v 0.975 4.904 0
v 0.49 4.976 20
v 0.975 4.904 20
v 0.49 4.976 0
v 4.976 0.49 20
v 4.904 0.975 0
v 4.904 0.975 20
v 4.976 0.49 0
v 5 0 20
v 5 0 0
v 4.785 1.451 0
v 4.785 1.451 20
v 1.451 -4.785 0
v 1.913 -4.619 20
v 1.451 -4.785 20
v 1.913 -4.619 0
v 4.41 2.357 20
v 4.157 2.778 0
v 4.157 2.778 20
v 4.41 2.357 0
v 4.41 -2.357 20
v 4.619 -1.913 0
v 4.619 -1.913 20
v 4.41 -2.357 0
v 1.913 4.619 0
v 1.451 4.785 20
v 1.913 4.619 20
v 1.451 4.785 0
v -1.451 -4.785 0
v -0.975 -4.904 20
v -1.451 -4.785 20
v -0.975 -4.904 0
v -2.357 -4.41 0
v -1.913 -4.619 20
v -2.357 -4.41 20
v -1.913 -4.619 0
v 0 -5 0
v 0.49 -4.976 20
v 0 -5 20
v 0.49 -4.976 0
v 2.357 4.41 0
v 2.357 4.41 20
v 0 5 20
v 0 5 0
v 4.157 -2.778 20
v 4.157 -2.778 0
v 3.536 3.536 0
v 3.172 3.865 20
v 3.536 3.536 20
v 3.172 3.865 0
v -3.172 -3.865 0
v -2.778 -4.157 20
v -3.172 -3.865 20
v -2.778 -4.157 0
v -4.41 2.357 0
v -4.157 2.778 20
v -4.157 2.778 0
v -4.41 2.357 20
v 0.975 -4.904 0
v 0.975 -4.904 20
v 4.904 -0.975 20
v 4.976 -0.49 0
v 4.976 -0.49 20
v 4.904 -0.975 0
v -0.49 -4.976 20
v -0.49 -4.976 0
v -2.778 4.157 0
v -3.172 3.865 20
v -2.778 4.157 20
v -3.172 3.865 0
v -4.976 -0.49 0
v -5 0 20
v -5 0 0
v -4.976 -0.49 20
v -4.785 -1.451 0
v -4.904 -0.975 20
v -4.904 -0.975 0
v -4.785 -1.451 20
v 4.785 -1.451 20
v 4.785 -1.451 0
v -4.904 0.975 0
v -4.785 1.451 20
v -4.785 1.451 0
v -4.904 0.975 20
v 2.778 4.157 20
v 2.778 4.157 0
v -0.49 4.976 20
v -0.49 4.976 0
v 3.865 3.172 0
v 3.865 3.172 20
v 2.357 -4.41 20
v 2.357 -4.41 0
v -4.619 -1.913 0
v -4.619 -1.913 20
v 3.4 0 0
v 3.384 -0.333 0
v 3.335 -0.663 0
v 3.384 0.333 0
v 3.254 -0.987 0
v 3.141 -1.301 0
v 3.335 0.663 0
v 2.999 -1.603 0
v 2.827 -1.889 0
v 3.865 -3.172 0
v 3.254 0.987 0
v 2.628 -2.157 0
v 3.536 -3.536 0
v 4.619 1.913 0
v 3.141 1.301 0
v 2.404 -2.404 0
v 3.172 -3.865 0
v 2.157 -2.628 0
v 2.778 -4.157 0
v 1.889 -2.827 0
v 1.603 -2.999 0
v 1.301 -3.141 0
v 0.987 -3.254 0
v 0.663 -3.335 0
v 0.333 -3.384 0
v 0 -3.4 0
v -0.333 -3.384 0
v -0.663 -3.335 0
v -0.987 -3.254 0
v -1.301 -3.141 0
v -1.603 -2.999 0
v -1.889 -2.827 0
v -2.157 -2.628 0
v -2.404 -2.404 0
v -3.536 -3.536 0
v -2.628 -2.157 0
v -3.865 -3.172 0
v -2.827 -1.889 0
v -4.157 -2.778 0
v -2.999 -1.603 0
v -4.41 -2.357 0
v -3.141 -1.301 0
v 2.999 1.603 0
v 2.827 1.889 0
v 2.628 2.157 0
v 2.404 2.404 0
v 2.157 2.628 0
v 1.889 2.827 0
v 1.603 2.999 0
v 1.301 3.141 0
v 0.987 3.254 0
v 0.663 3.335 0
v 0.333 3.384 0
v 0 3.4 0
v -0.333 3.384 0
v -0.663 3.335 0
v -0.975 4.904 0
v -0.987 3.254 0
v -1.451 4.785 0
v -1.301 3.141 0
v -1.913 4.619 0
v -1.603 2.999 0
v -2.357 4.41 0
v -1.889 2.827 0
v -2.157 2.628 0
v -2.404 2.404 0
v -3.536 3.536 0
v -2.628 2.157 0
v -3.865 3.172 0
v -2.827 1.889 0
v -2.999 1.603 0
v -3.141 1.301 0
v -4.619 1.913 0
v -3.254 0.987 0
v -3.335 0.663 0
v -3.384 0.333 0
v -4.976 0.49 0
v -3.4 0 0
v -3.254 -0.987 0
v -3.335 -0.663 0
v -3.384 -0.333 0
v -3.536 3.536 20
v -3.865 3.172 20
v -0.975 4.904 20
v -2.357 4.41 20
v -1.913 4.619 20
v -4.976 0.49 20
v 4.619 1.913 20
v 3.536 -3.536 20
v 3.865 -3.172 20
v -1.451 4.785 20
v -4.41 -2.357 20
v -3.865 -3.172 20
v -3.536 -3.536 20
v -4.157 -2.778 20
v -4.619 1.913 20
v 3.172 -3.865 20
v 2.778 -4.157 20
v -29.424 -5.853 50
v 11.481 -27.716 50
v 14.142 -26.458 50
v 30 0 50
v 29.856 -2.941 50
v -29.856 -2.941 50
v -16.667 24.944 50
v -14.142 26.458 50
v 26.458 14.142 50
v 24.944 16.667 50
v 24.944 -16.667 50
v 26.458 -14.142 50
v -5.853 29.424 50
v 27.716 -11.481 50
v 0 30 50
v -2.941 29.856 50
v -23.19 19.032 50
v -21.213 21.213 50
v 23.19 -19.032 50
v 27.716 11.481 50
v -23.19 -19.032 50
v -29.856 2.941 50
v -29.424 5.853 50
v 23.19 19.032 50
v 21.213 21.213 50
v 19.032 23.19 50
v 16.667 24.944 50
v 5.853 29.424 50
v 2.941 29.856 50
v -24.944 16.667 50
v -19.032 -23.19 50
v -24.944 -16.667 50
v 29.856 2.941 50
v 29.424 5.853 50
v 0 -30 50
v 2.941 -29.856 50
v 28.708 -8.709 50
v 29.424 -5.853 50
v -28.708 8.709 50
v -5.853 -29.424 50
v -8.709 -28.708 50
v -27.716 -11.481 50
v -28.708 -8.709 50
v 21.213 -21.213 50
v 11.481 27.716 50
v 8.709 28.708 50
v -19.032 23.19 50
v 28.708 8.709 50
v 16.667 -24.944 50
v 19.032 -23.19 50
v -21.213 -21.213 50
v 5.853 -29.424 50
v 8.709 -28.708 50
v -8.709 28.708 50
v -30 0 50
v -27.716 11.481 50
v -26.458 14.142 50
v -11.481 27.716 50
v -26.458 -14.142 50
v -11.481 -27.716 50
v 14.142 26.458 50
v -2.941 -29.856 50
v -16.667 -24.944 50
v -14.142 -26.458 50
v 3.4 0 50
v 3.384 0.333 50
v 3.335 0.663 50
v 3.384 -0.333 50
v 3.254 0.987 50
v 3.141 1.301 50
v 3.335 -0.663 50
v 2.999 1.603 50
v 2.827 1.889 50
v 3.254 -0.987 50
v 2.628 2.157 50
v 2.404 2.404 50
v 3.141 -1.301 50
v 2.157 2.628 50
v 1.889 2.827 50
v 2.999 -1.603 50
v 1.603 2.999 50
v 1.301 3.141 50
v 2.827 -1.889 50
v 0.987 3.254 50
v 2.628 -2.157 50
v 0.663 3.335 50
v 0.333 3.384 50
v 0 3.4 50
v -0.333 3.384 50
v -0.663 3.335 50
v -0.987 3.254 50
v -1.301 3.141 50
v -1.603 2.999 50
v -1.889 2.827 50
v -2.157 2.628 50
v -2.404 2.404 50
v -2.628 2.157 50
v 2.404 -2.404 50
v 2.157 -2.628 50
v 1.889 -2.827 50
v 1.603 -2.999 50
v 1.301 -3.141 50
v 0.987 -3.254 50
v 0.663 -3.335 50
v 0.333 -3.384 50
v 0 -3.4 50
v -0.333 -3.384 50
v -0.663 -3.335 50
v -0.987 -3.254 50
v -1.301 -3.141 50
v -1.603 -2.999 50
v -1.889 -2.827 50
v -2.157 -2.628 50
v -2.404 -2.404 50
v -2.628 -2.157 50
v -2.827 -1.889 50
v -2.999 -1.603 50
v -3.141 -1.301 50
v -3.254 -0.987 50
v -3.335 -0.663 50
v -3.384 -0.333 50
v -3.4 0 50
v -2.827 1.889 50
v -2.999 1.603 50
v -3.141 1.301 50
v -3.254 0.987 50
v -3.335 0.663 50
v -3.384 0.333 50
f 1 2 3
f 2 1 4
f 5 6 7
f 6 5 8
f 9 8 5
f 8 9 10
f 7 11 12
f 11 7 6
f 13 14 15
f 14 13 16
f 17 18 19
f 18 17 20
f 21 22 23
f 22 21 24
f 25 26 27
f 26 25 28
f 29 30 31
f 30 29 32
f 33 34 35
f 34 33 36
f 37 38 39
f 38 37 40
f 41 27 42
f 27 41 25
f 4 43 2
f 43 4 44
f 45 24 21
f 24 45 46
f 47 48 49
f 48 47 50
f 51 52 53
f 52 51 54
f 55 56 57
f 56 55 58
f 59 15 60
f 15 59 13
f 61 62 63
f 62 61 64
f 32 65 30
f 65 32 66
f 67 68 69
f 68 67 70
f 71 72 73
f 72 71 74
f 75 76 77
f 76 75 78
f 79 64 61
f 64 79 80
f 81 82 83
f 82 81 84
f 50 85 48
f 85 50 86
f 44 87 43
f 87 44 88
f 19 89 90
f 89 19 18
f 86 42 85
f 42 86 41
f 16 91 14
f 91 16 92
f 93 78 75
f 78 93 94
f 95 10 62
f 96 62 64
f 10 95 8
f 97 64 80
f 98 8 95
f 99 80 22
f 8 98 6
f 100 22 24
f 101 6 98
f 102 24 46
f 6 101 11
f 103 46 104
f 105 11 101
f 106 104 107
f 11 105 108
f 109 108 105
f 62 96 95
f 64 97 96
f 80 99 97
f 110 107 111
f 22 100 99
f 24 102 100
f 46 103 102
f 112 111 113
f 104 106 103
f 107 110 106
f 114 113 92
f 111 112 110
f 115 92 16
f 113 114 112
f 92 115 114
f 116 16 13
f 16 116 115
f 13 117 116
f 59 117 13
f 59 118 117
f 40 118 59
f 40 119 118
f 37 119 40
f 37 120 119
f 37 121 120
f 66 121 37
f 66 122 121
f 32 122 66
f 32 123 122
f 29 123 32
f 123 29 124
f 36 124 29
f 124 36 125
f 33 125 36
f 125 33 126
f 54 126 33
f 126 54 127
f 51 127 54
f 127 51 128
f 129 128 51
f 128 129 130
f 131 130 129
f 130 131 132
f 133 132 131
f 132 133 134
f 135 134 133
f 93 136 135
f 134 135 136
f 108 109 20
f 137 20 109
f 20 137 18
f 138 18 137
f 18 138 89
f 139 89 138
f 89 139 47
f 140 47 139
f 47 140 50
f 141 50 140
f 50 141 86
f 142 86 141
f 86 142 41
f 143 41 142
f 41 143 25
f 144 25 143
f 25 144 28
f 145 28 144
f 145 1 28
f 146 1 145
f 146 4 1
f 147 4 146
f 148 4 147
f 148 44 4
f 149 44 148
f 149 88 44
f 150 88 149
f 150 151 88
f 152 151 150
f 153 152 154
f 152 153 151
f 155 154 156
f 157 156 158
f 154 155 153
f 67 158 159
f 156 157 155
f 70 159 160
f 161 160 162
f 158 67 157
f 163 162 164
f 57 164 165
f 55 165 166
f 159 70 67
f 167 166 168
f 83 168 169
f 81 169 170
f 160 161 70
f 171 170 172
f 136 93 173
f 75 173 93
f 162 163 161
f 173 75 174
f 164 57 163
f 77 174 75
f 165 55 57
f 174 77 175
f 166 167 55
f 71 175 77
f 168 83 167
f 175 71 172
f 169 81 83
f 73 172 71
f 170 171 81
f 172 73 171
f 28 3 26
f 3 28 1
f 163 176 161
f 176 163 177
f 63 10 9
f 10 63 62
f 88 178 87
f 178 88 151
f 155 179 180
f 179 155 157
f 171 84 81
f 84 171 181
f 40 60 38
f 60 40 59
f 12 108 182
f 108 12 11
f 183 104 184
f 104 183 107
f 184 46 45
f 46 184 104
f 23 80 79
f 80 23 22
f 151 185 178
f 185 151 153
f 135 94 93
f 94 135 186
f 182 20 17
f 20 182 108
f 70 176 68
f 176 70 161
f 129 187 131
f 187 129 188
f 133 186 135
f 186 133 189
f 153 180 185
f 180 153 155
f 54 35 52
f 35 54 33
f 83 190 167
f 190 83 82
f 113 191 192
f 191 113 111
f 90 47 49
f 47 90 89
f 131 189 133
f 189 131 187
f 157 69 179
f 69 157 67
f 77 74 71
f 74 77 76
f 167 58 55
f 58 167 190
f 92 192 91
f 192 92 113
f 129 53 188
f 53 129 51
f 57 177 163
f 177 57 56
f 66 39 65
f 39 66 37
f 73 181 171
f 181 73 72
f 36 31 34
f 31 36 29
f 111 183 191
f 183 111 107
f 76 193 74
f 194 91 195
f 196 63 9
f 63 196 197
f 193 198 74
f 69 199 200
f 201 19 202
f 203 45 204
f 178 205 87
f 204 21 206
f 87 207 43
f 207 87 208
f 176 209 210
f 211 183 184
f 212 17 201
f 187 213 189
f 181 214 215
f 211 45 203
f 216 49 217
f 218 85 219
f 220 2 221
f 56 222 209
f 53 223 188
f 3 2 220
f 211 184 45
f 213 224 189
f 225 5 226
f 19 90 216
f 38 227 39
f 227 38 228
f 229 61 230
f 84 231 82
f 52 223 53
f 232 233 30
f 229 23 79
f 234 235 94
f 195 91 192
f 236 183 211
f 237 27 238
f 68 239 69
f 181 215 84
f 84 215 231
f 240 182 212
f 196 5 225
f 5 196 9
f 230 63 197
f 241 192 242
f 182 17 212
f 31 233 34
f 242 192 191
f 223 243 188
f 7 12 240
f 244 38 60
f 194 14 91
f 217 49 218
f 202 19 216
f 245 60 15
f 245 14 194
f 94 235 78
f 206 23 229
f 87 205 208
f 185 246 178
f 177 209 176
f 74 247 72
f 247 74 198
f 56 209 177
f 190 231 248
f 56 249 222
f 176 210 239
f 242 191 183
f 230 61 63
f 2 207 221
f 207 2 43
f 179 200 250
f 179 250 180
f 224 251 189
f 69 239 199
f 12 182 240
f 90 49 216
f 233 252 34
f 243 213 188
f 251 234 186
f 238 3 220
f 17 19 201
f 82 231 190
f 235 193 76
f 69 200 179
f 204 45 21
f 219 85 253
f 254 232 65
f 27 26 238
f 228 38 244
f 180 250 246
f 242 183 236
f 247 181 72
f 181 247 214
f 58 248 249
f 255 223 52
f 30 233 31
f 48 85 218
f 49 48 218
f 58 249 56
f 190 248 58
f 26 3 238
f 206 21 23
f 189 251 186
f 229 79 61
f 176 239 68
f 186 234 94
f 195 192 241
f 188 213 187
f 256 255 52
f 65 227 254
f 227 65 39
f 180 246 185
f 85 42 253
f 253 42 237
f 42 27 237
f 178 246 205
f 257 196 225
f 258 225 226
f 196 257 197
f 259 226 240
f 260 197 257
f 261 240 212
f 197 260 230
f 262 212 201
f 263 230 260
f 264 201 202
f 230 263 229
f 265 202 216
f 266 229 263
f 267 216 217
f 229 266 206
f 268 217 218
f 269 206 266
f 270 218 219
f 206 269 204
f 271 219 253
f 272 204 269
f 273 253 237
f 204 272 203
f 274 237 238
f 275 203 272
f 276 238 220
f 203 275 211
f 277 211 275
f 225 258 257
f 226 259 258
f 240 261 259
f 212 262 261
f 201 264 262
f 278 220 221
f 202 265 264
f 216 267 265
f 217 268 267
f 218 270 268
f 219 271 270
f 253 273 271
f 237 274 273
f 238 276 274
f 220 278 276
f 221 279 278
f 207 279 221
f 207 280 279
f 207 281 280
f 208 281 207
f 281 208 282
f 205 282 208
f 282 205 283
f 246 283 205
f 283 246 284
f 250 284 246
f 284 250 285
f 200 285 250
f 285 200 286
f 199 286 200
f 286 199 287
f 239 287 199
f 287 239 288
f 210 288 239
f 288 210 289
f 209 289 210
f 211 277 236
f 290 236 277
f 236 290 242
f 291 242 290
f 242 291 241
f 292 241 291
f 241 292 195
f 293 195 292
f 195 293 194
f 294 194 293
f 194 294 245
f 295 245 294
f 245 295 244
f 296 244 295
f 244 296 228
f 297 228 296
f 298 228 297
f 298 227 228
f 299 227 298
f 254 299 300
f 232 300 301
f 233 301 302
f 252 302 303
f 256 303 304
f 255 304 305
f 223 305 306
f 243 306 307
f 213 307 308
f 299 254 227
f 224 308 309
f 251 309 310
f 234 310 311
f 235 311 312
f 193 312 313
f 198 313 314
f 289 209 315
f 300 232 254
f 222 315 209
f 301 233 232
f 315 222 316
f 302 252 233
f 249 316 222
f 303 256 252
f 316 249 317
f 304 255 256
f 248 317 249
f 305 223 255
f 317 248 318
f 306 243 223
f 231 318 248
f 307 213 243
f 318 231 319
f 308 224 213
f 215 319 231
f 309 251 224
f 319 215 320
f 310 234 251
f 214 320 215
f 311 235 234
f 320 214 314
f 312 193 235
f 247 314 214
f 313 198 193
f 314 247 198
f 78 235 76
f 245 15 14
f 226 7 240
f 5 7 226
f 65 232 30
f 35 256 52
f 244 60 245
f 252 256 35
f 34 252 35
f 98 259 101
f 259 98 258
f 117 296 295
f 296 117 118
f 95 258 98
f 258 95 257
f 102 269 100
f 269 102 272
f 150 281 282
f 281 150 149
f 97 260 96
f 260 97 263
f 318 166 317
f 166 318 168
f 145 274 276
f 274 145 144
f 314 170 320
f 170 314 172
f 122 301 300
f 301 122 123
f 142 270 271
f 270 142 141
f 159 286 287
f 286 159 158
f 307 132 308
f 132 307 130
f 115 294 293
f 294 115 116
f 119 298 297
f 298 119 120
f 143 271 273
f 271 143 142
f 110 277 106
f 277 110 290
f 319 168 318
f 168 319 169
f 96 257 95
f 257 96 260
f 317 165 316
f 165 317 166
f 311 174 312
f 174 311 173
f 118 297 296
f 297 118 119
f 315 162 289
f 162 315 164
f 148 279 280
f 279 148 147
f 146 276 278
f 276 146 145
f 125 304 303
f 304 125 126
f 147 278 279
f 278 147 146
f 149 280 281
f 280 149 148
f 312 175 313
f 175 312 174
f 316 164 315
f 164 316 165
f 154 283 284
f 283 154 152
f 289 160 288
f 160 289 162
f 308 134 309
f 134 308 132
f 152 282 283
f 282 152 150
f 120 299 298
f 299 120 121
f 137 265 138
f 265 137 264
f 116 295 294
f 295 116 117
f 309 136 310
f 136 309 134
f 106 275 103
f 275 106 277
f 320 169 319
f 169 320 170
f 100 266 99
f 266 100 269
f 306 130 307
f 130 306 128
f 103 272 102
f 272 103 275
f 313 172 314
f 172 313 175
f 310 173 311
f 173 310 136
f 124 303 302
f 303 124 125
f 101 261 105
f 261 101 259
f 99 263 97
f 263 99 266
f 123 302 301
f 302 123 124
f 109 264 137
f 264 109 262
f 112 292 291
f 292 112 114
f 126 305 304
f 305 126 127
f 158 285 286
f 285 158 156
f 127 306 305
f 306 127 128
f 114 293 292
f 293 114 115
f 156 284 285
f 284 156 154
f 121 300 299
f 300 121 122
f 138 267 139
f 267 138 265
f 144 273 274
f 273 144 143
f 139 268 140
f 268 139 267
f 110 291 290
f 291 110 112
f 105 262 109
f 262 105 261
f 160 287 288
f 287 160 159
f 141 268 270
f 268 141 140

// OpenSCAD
// Lab funnel - printed upright, open at top and bottom
// Units: mm

$fn = 64;

// --- Dimensions ---
spout_od      = 10;    // spout outer diameter
spout_length  = 20;    // spout runs from z = 0 to z = 20
cone_top_d    = 60;    // cone rim diameter at z = 50
cone_bottom_d = 10;    // cone diameter at z = 20 (spout top)
wall          = 1.6;   // wall thickness everywhere

// Derived
spout_id = spout_od - 2 * wall;   // bore diameter = 6.8
total_h  = 50;                    // top of rim

// --- Model ---
difference() {
    union() {
        // Straight spout
        cylinder(d = spout_od, h = spout_length);
        // Cone from z = 20 to z = 50
        translate([0, 0, spout_length])
            cylinder(d1 = cone_bottom_d, d2 = cone_top_d, h = total_h - spout_length);
    }
    // Through-bore: spout bore + extended cone bore (keeps same wall thickness)
    translate([0, 0, -wall])
        linear_extrude(height = total_h + 2 * wall)
            circle(d = spout_id);
    translate([0, 0, spout_length])
        linear_extrude(height = total_h - spout_length + wall)
            circle(d1 = cone_bottom_d - 2 * wall, d2 = cone_top_d - 2 * wall);
}
